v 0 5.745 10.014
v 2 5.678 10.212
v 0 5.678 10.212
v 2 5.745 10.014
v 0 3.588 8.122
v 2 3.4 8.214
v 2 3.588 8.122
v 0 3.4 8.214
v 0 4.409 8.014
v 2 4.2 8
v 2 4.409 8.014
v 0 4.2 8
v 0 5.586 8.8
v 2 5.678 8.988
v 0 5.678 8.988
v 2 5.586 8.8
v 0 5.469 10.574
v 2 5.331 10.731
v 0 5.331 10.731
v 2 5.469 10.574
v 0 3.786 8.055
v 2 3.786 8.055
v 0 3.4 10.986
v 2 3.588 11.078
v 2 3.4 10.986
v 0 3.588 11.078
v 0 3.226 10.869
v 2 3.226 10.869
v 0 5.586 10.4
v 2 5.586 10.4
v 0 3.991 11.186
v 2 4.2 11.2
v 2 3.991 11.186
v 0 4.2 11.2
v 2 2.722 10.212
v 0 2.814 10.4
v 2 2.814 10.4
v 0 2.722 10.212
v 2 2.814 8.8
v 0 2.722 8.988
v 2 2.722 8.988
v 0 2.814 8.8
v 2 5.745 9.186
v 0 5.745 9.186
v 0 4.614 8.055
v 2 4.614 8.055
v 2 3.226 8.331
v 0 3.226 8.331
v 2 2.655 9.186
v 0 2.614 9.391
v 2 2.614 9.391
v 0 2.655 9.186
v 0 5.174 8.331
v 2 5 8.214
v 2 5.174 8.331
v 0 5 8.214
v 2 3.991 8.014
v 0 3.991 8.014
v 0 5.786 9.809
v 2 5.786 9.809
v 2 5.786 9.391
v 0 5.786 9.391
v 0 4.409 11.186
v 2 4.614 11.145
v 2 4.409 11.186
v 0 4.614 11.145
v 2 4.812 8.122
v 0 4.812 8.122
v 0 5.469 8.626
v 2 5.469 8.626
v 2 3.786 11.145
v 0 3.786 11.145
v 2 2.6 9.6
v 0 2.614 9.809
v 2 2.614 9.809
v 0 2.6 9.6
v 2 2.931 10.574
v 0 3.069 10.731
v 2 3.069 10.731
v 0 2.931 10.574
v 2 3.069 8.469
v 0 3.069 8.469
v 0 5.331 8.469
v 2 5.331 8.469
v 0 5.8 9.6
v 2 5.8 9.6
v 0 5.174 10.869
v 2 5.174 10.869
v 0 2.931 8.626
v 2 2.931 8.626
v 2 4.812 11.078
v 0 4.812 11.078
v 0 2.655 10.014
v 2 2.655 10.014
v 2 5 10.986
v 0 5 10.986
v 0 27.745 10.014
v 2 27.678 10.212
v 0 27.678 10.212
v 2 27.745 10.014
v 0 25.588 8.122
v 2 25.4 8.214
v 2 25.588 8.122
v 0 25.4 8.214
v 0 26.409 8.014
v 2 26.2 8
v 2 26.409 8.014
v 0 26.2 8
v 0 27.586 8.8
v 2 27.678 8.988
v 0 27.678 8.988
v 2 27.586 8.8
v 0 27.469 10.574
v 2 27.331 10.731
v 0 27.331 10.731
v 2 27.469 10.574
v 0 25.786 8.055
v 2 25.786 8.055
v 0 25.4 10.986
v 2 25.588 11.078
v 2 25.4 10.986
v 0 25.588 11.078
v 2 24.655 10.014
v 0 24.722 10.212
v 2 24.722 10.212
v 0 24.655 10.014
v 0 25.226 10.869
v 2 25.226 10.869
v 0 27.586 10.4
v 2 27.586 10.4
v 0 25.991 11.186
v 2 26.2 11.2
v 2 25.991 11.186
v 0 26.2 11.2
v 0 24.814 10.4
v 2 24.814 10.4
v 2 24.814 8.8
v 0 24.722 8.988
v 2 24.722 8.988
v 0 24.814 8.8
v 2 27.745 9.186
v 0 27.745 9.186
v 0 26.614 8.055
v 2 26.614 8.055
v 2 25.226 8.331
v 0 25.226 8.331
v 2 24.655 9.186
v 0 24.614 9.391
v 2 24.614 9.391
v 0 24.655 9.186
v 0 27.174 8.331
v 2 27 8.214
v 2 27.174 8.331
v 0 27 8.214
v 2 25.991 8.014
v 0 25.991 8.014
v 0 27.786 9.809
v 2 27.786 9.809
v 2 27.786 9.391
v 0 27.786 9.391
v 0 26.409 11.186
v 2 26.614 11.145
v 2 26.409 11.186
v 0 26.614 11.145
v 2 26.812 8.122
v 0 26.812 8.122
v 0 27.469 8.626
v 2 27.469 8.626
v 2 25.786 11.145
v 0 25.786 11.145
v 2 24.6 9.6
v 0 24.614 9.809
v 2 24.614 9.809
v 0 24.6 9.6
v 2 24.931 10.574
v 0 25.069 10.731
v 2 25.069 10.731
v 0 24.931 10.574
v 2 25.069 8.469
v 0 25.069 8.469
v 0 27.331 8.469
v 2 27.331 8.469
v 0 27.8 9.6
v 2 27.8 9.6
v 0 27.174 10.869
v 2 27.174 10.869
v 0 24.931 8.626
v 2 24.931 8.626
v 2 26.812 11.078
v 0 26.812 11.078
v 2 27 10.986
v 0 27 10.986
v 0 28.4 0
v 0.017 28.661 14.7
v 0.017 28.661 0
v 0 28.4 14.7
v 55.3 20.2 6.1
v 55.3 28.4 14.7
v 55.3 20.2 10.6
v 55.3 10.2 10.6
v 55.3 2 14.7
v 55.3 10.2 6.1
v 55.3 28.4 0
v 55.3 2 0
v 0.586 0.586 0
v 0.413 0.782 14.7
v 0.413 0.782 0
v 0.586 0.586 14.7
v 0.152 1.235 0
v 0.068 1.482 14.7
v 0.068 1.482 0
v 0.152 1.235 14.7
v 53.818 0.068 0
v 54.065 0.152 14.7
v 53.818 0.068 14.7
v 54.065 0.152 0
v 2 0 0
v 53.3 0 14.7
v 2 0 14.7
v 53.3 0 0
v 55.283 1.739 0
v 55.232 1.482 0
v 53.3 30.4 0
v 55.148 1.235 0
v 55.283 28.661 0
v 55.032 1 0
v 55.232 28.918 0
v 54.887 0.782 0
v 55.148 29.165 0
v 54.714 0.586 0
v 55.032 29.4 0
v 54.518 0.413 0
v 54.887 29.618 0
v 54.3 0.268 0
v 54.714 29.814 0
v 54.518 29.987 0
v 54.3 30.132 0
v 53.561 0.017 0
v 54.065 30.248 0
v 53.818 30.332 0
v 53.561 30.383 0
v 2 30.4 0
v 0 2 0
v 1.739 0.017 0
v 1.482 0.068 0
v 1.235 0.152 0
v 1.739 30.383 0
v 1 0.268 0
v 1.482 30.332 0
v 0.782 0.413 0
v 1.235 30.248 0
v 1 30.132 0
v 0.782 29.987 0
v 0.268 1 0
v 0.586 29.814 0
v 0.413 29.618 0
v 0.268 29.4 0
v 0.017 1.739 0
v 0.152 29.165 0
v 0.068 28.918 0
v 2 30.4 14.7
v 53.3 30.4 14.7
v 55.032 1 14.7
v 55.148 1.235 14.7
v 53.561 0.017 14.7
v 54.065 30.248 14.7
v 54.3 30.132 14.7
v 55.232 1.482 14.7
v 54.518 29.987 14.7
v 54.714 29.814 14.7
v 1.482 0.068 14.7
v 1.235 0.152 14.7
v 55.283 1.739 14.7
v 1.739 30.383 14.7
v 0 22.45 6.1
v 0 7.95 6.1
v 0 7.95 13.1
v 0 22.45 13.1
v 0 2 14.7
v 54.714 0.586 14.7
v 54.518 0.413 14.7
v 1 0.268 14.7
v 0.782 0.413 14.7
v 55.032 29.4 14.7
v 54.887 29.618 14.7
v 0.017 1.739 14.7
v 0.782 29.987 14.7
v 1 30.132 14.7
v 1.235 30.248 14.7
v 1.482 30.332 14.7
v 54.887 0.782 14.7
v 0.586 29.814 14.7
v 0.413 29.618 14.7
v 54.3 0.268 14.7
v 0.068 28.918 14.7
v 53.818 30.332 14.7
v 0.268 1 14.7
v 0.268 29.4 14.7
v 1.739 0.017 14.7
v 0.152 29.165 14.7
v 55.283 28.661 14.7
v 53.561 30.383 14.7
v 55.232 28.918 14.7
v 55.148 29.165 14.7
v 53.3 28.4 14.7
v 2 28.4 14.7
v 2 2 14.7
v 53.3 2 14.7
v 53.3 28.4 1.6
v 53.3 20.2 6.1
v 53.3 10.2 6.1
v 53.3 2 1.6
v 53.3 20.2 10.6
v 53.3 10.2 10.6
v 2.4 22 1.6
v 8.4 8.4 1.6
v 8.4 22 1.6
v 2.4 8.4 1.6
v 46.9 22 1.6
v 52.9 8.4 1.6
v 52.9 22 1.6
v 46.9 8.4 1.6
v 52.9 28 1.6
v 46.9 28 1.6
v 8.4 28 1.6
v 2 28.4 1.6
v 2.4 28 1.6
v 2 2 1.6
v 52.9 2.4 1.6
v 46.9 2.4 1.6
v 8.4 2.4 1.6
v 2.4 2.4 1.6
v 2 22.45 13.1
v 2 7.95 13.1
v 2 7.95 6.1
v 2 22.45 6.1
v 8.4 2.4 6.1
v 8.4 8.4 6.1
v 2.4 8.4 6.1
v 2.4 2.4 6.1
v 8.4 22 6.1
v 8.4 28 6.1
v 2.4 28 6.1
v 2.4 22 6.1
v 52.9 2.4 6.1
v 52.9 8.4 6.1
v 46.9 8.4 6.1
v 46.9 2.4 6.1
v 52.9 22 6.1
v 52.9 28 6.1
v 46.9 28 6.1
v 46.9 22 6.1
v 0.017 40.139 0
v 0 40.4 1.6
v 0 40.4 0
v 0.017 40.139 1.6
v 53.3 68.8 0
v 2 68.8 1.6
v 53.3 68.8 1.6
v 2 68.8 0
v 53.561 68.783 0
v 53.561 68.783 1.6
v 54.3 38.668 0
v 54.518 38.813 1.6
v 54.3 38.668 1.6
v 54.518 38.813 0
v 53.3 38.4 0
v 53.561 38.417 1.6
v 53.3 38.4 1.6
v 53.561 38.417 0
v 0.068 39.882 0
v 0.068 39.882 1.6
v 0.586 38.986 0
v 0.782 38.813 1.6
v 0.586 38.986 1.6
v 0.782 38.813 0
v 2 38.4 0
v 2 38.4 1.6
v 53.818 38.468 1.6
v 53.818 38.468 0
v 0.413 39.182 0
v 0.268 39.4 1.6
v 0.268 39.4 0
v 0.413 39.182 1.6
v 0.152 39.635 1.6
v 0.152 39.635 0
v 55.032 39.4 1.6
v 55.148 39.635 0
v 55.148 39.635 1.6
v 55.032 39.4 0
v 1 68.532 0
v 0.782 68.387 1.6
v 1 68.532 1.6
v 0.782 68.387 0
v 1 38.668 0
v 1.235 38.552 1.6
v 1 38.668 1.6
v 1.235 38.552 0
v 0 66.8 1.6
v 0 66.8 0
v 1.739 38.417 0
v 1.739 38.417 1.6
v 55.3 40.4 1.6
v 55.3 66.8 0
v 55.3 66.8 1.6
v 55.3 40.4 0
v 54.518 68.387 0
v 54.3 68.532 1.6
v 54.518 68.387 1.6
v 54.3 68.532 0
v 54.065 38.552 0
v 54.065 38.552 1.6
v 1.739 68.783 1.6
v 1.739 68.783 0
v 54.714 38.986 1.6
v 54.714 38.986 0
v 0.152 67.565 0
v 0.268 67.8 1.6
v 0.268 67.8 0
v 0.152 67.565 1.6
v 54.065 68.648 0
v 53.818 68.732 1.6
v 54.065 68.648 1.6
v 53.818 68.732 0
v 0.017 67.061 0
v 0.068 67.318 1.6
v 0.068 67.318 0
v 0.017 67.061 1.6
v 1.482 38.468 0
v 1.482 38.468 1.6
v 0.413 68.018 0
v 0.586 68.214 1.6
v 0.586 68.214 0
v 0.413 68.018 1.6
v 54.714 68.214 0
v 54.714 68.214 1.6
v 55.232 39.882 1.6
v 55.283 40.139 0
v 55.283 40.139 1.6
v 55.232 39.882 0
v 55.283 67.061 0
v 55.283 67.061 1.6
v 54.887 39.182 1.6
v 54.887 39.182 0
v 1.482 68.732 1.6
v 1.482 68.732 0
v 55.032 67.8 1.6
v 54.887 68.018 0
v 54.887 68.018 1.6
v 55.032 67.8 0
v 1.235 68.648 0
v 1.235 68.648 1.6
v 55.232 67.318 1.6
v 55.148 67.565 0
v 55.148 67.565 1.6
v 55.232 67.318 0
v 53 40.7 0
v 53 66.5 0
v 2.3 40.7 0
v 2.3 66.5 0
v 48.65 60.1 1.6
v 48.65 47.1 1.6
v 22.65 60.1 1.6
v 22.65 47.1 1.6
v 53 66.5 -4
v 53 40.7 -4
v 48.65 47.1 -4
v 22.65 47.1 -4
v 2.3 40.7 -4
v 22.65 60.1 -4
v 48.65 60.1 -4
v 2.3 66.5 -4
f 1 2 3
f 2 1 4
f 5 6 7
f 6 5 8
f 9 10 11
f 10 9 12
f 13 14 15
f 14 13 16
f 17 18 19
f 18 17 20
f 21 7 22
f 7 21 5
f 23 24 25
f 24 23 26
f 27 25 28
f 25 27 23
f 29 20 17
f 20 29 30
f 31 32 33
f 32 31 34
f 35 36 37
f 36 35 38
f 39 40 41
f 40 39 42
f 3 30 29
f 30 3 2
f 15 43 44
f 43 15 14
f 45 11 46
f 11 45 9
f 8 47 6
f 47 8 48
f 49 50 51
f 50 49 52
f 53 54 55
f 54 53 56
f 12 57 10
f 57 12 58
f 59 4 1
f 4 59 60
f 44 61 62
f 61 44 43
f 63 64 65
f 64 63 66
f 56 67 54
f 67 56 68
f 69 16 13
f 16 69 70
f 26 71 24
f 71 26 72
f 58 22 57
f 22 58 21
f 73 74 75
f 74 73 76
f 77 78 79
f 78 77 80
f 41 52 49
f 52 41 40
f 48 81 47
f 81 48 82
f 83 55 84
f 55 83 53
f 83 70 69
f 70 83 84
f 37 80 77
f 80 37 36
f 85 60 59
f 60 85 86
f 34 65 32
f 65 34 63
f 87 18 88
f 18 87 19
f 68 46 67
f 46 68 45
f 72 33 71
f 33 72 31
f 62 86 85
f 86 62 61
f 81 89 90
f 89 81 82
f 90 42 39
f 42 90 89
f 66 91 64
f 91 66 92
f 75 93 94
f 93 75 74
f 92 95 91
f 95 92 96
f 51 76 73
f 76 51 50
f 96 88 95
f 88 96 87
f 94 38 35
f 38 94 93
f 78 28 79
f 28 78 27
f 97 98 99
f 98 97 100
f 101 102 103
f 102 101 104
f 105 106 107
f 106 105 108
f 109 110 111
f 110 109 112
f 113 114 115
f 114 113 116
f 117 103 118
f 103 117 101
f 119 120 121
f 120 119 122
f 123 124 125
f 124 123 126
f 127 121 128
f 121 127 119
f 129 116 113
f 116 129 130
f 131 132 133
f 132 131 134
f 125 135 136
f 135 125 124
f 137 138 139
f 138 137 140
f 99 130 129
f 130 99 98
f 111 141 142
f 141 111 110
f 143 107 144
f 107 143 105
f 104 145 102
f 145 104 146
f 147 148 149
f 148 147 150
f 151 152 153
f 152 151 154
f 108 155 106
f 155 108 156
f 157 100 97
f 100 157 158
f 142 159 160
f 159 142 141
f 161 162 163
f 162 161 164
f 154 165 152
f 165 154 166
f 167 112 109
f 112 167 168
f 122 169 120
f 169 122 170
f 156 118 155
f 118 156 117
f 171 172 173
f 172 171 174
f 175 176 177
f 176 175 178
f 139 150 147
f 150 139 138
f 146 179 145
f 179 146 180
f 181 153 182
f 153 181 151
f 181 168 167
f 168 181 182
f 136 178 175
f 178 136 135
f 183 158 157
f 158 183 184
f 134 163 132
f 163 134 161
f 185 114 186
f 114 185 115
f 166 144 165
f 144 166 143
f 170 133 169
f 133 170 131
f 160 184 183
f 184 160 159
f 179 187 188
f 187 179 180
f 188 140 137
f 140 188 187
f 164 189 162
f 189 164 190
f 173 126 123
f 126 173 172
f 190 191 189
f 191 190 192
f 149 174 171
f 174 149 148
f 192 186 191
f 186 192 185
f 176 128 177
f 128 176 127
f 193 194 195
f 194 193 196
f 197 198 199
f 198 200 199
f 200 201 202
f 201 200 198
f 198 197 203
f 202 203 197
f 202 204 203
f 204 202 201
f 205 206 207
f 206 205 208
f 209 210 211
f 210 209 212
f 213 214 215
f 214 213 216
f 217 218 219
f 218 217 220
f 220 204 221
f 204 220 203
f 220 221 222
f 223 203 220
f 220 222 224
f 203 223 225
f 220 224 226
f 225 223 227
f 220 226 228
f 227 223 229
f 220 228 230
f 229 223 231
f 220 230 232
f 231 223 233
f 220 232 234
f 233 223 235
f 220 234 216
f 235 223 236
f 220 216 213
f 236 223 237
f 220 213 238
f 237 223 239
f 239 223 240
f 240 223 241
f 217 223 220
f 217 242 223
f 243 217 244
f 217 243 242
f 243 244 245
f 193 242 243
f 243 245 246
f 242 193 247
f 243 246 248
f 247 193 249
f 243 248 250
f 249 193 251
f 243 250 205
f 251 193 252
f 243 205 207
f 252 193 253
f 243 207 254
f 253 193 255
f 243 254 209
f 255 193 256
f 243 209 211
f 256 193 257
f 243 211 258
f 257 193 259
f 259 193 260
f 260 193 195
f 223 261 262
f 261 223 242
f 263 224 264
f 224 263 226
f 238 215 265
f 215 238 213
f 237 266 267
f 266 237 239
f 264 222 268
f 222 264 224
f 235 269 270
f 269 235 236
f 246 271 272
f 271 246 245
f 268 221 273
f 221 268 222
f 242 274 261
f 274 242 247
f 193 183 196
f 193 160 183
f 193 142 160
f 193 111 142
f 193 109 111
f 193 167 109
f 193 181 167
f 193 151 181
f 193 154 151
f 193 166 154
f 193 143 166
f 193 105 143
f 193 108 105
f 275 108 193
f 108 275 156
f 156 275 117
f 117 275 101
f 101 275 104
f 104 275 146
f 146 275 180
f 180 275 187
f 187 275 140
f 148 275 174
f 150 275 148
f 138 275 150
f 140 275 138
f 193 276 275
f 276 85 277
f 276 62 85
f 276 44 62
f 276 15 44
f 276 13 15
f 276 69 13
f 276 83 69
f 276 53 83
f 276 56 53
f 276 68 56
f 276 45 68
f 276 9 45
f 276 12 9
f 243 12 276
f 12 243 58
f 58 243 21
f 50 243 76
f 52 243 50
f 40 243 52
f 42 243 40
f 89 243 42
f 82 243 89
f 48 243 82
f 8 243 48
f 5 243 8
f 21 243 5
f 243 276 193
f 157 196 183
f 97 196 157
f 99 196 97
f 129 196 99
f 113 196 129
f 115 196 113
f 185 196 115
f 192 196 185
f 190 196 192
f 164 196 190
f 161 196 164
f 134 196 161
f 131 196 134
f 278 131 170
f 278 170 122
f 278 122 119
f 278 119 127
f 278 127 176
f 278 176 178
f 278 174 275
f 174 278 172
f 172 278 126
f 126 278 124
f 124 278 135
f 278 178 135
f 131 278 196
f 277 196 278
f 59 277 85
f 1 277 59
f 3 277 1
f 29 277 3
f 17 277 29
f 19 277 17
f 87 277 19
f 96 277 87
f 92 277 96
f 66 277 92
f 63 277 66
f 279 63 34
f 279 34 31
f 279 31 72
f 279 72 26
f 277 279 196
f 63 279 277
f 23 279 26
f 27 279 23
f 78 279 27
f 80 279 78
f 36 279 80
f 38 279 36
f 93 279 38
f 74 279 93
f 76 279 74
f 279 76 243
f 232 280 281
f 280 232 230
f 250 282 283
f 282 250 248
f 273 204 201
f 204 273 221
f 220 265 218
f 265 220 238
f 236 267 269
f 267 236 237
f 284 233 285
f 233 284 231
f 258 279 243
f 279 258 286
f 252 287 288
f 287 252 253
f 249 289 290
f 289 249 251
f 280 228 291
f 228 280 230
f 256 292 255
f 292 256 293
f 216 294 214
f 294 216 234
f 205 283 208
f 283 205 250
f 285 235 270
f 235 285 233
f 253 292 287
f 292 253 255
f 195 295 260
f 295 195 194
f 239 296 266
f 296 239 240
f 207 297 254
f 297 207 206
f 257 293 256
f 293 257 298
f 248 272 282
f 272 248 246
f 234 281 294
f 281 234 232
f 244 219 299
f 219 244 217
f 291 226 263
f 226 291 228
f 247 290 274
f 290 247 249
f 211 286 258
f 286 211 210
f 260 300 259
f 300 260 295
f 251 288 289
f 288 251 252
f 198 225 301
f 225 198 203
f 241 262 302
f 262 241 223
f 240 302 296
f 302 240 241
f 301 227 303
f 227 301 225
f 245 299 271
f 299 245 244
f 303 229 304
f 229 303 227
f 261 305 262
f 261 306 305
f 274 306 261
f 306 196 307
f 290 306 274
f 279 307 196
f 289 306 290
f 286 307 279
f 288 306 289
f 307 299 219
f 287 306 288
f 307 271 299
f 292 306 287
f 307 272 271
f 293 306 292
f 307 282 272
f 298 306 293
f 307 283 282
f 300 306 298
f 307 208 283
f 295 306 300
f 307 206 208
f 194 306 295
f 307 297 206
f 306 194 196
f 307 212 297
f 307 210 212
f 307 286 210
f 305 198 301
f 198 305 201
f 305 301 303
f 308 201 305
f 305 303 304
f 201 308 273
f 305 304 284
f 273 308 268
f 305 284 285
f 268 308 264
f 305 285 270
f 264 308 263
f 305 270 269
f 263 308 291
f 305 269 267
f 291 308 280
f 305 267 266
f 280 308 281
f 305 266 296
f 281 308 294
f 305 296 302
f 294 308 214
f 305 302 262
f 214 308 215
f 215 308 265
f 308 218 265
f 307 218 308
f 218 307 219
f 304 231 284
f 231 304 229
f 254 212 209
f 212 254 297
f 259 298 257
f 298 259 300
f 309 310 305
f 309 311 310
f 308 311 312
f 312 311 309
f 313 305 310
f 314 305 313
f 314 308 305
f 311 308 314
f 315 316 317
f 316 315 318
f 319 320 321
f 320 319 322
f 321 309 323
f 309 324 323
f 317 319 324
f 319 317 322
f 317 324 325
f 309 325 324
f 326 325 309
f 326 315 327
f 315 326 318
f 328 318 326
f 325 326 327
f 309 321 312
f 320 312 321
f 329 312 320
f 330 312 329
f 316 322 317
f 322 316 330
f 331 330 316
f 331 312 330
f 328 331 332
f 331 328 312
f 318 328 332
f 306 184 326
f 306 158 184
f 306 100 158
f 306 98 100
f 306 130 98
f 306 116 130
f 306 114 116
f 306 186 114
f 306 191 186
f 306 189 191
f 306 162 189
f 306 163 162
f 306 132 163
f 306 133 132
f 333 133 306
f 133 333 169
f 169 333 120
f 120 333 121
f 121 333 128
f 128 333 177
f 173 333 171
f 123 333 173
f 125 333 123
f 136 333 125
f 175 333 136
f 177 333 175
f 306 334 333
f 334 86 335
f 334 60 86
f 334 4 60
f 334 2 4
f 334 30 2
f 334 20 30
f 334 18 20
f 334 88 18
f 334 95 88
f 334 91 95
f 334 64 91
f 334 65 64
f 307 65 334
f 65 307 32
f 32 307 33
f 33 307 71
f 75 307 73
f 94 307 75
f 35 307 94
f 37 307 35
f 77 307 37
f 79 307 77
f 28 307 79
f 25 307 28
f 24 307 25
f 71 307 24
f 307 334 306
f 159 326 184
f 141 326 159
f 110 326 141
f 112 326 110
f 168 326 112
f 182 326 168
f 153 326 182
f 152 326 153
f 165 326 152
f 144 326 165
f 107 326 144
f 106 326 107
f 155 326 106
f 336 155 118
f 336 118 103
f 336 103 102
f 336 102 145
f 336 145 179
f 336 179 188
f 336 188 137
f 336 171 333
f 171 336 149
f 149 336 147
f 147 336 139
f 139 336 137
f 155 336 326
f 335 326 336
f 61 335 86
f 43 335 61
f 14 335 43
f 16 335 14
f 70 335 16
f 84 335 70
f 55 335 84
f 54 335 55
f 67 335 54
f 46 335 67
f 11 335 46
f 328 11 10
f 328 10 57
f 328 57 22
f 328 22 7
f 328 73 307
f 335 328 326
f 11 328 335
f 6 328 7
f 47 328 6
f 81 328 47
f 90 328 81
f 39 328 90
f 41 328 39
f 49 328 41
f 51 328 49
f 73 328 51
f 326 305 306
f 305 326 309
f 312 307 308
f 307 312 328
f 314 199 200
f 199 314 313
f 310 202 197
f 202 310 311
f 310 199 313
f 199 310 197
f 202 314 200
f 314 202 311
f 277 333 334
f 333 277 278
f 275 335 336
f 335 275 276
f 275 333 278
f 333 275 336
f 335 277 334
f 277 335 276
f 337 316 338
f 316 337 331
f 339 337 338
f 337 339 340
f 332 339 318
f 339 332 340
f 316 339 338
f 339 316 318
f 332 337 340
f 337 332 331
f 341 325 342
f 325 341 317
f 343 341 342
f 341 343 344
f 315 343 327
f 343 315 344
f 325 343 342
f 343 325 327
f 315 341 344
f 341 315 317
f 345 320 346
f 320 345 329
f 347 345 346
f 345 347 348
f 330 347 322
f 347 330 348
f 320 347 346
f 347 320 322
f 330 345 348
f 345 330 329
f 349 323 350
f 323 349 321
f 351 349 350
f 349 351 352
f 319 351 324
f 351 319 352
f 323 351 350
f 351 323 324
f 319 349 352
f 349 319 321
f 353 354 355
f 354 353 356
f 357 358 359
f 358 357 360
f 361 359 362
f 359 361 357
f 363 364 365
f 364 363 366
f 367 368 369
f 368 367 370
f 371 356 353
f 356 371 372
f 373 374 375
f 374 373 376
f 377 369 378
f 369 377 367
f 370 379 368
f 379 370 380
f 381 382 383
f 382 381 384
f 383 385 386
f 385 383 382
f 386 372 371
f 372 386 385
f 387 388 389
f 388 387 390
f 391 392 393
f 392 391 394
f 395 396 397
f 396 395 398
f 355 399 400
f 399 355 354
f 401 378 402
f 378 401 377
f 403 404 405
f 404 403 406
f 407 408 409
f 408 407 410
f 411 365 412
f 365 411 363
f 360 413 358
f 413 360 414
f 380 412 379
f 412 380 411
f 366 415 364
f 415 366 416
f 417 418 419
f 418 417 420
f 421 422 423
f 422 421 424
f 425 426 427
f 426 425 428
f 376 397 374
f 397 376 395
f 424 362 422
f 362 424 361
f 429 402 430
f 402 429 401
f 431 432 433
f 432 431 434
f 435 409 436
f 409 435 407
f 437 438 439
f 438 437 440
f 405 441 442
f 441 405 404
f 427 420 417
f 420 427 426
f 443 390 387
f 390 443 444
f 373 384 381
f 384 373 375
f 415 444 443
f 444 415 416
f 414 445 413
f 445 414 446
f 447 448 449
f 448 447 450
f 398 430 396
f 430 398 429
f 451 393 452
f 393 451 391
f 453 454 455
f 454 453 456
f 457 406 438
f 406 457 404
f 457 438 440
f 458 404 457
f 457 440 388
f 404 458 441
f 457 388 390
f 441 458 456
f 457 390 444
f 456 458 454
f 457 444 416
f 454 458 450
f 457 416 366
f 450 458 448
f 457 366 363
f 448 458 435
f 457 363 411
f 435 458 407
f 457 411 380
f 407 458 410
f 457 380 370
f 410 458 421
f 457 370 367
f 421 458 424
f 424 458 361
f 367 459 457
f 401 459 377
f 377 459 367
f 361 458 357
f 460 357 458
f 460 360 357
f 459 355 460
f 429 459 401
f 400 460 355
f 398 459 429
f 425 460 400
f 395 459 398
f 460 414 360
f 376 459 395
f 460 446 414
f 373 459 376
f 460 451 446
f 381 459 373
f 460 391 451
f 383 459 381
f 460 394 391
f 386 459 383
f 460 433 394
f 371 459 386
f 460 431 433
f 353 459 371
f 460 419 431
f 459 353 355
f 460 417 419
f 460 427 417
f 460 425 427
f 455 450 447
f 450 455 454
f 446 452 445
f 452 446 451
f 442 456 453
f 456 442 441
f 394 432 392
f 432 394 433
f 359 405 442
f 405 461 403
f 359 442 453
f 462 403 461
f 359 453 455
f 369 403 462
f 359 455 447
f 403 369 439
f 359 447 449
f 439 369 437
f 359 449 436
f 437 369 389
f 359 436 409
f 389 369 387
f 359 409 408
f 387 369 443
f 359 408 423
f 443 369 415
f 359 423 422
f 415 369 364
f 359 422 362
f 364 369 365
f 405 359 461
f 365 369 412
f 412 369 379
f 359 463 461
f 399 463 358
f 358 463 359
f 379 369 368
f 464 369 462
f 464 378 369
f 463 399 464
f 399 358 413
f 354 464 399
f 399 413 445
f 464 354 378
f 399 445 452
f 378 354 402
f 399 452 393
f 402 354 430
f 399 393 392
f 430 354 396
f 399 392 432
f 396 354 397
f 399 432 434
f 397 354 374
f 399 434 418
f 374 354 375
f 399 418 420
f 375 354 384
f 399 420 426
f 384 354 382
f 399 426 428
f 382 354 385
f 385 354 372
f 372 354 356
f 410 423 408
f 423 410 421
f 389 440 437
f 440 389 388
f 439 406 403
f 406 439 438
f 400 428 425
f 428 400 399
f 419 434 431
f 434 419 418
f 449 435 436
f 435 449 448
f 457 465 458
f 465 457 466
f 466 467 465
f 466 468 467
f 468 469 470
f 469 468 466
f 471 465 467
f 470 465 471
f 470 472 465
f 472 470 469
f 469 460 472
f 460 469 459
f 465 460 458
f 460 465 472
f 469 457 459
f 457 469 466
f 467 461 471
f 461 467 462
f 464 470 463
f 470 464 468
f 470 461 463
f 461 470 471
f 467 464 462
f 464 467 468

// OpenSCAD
// =====================================================================
// CW Bridge field enclosure — Heltec WiFi Kit 32 v3.1 + USB-A host jack
// Parametric, two-part friction-fit box. Open in OpenSCAD, set `part`,
// press F6 (render), then Export as STL.
//
//   part = "base"  -> the box that holds the Heltec
//   part = "lid"   -> the snap-on lid with the OLED window
//   part = "both"  -> preview both side by side (don't print this)
//
//  >>> MEASURE YOUR ACTUAL PARTS WITH CALIPERS AND ADJUST <<<
//  Defaults are for the Heltec WiFi Kit 32 v3.1 (PCB ~50.2 x 25.4 mm)
//  and a generic panel-mount USB-A female jack. Print a quick test of
//  just one end wall before committing to the full box if unsure.
// =====================================================================

part = "both";      // "base" | "lid" | "both"
$fn = 48;

// ---- Heltec board ----------------------------------------------------
board_l   = 50.5;   // X, PCB length (+ a hair of clearance)
board_w   = 25.6;   // Y, PCB width
board_t   = 1.6;    // PCB thickness
fit       = 0.4;    // clearance around the board on each side

// ---- box shell -------------------------------------------------------
wall      = 2.0;    // side-wall thickness
floor_t   = 1.6;    // base floor thickness
lid_t     = 1.6;    // lid top thickness
standoff  = 4.5;    // board sits this high off the floor (clears the
                    // underside JST battery connector + your hookup wires)
top_clear = 7.0;    // space above the PCB for the OLED + wiring + lid lip
corner_r  = 2.0;    // outer corner rounding

// ---- USB-C (power / programming) — one short end --------------------
usbc_w    = 10.0;   // cutout width  (Y)
usbc_h    = 4.5;    // cutout height (Z)
usbc_yoff = 0;      // shift along Y if the port isn't centered

// ---- USB-A host jack — opposite short end ---------------------------
usba_w    = 14.5;   // cutout width  (Y)  — panel-mount USB-A shell
usba_h    = 7.0;    // cutout height (Z)
usba_screws   = true;   // two M3 flange holes (common on panel jacks)
usba_screw_dx = 22.0;   // hole spacing (measure yours!)
usba_screw_d  = 3.2;    // M3 clearance

// ---- OLED window (in the lid) ---------------------------------------
oled_win_l = 26.0;  // X length of the window
oled_win_w = 13.0;  // Y width
oled_win_xoff = 8.0;// shift toward the USB-C end (the OLED is offset)

// ---- optional control holes in the lid (EC-11 + 3 buttons) ----------
include_controls = false;   // set true to add encoder + button holes
enc_hole_d  = 7.2;          // EC-11 bushing
btn_hole_d  = 12.2;         // 12 mm panel tactile (use 6.5 for 6 mm)
ctrl_yoff   = 0;            // row position along Y

// ===================== derived ========================================
in_l = board_l + 2*fit;             // inner cavity X
in_w = board_w + 2*fit;             // inner cavity Y
in_h = standoff + board_t + top_clear; // inner cavity Z
out_l = in_l + 2*wall;
out_w = in_w + 2*wall;
board_z = floor_t + standoff;        // top of standoffs = board underside

module rrect(l, w, h, r) {           // rounded box
    hull() for (xx=[r, l-r], yy=[r, w-r])
        translate([xx, yy, 0]) cylinder(h=h, r=r);
}

// ===================== BASE ===========================================
module base() {
    difference() {
        union() {
            // outer shell
            rrect(out_l, out_w, floor_t + in_h, corner_r);
        }
        // hollow cavity
        translate([wall, wall, floor_t])
            cube([in_l, in_w, in_h + 1]);
        // USB-C cutout (+X end), at board level
        translate([out_l - wall - 1, out_w/2 - usbc_w/2 + usbc_yoff, board_z])
            cube([wall + 2, usbc_w, usbc_h]);
        // USB-A cutout (-X end)
        translate([-1, out_w/2 - usba_w/2, board_z])
            cube([wall + 2, usba_w, usba_h]);
        if (usba_screws)
            for (s=[-1,1])
                translate([-1, out_w/2 + s*usba_screw_dx/2, board_z + usba_h/2])
                    rotate([0,90,0]) cylinder(h=wall+2, d=usba_screw_d);
    }
    // four corner standoffs the PCB rests on
    for (xx=[wall+fit+3, wall+fit+in_l-fit*2-3],
         yy=[wall+fit+3, wall+fit+in_w-fit*2-3])
        translate([xx-3, yy-3, floor_t]) cube([6, 6, standoff]);
}

// ===================== LID ============================================
module lid() {
    lip_h   = 4;            // depth the lip plugs into the cavity
    lip_fit = 0.3;          // friction clearance
    difference() {
        union() {
            // top plate (same footprint as the box)
            rrect(out_l, out_w, lid_t, corner_r);
            // inner lip that friction-fits into the cavity
            translate([wall + lip_fit, wall + lip_fit, -lip_h])
                cube([in_l - 2*lip_fit, in_w - 2*lip_fit, lip_h]);
        }
        // OLED window
        translate([out_l/2 - oled_win_l/2 + oled_win_xoff,
                   out_w/2 - oled_win_w/2, -lip_h - 1])
            cube([oled_win_l, oled_win_w, lid_t + lip_h + 2]);
        // optional control holes: EC-11 near the USB-A end, then three
        // buttons in a row toward the USB-C end. Tune positions to taste —
        // these can't overlap the OLED window, so a taller box/longer lid
        // may be wanted if you mount all four on top.
        if (include_controls) {
            translate([10, out_w/2 + ctrl_yoff, -lip_h-1])
                cylinder(h=lid_t+lip_h+2, d=enc_hole_d);
            for (i=[0:2])
                translate([out_l - 12 - i*13, out_w/2 + ctrl_yoff, -lip_h-1])
                    cylinder(h=lid_t+lip_h+2, d=btn_hole_d);
        }
    }
}

// ===================== render =========================================
if (part == "base") base();
else if (part == "lid") translate([0,0,floor_t+in_h]) rotate([180,0,0]) lid();
else { base(); translate([0, out_w + 8, 0]) lid(); }   // "both" preview
